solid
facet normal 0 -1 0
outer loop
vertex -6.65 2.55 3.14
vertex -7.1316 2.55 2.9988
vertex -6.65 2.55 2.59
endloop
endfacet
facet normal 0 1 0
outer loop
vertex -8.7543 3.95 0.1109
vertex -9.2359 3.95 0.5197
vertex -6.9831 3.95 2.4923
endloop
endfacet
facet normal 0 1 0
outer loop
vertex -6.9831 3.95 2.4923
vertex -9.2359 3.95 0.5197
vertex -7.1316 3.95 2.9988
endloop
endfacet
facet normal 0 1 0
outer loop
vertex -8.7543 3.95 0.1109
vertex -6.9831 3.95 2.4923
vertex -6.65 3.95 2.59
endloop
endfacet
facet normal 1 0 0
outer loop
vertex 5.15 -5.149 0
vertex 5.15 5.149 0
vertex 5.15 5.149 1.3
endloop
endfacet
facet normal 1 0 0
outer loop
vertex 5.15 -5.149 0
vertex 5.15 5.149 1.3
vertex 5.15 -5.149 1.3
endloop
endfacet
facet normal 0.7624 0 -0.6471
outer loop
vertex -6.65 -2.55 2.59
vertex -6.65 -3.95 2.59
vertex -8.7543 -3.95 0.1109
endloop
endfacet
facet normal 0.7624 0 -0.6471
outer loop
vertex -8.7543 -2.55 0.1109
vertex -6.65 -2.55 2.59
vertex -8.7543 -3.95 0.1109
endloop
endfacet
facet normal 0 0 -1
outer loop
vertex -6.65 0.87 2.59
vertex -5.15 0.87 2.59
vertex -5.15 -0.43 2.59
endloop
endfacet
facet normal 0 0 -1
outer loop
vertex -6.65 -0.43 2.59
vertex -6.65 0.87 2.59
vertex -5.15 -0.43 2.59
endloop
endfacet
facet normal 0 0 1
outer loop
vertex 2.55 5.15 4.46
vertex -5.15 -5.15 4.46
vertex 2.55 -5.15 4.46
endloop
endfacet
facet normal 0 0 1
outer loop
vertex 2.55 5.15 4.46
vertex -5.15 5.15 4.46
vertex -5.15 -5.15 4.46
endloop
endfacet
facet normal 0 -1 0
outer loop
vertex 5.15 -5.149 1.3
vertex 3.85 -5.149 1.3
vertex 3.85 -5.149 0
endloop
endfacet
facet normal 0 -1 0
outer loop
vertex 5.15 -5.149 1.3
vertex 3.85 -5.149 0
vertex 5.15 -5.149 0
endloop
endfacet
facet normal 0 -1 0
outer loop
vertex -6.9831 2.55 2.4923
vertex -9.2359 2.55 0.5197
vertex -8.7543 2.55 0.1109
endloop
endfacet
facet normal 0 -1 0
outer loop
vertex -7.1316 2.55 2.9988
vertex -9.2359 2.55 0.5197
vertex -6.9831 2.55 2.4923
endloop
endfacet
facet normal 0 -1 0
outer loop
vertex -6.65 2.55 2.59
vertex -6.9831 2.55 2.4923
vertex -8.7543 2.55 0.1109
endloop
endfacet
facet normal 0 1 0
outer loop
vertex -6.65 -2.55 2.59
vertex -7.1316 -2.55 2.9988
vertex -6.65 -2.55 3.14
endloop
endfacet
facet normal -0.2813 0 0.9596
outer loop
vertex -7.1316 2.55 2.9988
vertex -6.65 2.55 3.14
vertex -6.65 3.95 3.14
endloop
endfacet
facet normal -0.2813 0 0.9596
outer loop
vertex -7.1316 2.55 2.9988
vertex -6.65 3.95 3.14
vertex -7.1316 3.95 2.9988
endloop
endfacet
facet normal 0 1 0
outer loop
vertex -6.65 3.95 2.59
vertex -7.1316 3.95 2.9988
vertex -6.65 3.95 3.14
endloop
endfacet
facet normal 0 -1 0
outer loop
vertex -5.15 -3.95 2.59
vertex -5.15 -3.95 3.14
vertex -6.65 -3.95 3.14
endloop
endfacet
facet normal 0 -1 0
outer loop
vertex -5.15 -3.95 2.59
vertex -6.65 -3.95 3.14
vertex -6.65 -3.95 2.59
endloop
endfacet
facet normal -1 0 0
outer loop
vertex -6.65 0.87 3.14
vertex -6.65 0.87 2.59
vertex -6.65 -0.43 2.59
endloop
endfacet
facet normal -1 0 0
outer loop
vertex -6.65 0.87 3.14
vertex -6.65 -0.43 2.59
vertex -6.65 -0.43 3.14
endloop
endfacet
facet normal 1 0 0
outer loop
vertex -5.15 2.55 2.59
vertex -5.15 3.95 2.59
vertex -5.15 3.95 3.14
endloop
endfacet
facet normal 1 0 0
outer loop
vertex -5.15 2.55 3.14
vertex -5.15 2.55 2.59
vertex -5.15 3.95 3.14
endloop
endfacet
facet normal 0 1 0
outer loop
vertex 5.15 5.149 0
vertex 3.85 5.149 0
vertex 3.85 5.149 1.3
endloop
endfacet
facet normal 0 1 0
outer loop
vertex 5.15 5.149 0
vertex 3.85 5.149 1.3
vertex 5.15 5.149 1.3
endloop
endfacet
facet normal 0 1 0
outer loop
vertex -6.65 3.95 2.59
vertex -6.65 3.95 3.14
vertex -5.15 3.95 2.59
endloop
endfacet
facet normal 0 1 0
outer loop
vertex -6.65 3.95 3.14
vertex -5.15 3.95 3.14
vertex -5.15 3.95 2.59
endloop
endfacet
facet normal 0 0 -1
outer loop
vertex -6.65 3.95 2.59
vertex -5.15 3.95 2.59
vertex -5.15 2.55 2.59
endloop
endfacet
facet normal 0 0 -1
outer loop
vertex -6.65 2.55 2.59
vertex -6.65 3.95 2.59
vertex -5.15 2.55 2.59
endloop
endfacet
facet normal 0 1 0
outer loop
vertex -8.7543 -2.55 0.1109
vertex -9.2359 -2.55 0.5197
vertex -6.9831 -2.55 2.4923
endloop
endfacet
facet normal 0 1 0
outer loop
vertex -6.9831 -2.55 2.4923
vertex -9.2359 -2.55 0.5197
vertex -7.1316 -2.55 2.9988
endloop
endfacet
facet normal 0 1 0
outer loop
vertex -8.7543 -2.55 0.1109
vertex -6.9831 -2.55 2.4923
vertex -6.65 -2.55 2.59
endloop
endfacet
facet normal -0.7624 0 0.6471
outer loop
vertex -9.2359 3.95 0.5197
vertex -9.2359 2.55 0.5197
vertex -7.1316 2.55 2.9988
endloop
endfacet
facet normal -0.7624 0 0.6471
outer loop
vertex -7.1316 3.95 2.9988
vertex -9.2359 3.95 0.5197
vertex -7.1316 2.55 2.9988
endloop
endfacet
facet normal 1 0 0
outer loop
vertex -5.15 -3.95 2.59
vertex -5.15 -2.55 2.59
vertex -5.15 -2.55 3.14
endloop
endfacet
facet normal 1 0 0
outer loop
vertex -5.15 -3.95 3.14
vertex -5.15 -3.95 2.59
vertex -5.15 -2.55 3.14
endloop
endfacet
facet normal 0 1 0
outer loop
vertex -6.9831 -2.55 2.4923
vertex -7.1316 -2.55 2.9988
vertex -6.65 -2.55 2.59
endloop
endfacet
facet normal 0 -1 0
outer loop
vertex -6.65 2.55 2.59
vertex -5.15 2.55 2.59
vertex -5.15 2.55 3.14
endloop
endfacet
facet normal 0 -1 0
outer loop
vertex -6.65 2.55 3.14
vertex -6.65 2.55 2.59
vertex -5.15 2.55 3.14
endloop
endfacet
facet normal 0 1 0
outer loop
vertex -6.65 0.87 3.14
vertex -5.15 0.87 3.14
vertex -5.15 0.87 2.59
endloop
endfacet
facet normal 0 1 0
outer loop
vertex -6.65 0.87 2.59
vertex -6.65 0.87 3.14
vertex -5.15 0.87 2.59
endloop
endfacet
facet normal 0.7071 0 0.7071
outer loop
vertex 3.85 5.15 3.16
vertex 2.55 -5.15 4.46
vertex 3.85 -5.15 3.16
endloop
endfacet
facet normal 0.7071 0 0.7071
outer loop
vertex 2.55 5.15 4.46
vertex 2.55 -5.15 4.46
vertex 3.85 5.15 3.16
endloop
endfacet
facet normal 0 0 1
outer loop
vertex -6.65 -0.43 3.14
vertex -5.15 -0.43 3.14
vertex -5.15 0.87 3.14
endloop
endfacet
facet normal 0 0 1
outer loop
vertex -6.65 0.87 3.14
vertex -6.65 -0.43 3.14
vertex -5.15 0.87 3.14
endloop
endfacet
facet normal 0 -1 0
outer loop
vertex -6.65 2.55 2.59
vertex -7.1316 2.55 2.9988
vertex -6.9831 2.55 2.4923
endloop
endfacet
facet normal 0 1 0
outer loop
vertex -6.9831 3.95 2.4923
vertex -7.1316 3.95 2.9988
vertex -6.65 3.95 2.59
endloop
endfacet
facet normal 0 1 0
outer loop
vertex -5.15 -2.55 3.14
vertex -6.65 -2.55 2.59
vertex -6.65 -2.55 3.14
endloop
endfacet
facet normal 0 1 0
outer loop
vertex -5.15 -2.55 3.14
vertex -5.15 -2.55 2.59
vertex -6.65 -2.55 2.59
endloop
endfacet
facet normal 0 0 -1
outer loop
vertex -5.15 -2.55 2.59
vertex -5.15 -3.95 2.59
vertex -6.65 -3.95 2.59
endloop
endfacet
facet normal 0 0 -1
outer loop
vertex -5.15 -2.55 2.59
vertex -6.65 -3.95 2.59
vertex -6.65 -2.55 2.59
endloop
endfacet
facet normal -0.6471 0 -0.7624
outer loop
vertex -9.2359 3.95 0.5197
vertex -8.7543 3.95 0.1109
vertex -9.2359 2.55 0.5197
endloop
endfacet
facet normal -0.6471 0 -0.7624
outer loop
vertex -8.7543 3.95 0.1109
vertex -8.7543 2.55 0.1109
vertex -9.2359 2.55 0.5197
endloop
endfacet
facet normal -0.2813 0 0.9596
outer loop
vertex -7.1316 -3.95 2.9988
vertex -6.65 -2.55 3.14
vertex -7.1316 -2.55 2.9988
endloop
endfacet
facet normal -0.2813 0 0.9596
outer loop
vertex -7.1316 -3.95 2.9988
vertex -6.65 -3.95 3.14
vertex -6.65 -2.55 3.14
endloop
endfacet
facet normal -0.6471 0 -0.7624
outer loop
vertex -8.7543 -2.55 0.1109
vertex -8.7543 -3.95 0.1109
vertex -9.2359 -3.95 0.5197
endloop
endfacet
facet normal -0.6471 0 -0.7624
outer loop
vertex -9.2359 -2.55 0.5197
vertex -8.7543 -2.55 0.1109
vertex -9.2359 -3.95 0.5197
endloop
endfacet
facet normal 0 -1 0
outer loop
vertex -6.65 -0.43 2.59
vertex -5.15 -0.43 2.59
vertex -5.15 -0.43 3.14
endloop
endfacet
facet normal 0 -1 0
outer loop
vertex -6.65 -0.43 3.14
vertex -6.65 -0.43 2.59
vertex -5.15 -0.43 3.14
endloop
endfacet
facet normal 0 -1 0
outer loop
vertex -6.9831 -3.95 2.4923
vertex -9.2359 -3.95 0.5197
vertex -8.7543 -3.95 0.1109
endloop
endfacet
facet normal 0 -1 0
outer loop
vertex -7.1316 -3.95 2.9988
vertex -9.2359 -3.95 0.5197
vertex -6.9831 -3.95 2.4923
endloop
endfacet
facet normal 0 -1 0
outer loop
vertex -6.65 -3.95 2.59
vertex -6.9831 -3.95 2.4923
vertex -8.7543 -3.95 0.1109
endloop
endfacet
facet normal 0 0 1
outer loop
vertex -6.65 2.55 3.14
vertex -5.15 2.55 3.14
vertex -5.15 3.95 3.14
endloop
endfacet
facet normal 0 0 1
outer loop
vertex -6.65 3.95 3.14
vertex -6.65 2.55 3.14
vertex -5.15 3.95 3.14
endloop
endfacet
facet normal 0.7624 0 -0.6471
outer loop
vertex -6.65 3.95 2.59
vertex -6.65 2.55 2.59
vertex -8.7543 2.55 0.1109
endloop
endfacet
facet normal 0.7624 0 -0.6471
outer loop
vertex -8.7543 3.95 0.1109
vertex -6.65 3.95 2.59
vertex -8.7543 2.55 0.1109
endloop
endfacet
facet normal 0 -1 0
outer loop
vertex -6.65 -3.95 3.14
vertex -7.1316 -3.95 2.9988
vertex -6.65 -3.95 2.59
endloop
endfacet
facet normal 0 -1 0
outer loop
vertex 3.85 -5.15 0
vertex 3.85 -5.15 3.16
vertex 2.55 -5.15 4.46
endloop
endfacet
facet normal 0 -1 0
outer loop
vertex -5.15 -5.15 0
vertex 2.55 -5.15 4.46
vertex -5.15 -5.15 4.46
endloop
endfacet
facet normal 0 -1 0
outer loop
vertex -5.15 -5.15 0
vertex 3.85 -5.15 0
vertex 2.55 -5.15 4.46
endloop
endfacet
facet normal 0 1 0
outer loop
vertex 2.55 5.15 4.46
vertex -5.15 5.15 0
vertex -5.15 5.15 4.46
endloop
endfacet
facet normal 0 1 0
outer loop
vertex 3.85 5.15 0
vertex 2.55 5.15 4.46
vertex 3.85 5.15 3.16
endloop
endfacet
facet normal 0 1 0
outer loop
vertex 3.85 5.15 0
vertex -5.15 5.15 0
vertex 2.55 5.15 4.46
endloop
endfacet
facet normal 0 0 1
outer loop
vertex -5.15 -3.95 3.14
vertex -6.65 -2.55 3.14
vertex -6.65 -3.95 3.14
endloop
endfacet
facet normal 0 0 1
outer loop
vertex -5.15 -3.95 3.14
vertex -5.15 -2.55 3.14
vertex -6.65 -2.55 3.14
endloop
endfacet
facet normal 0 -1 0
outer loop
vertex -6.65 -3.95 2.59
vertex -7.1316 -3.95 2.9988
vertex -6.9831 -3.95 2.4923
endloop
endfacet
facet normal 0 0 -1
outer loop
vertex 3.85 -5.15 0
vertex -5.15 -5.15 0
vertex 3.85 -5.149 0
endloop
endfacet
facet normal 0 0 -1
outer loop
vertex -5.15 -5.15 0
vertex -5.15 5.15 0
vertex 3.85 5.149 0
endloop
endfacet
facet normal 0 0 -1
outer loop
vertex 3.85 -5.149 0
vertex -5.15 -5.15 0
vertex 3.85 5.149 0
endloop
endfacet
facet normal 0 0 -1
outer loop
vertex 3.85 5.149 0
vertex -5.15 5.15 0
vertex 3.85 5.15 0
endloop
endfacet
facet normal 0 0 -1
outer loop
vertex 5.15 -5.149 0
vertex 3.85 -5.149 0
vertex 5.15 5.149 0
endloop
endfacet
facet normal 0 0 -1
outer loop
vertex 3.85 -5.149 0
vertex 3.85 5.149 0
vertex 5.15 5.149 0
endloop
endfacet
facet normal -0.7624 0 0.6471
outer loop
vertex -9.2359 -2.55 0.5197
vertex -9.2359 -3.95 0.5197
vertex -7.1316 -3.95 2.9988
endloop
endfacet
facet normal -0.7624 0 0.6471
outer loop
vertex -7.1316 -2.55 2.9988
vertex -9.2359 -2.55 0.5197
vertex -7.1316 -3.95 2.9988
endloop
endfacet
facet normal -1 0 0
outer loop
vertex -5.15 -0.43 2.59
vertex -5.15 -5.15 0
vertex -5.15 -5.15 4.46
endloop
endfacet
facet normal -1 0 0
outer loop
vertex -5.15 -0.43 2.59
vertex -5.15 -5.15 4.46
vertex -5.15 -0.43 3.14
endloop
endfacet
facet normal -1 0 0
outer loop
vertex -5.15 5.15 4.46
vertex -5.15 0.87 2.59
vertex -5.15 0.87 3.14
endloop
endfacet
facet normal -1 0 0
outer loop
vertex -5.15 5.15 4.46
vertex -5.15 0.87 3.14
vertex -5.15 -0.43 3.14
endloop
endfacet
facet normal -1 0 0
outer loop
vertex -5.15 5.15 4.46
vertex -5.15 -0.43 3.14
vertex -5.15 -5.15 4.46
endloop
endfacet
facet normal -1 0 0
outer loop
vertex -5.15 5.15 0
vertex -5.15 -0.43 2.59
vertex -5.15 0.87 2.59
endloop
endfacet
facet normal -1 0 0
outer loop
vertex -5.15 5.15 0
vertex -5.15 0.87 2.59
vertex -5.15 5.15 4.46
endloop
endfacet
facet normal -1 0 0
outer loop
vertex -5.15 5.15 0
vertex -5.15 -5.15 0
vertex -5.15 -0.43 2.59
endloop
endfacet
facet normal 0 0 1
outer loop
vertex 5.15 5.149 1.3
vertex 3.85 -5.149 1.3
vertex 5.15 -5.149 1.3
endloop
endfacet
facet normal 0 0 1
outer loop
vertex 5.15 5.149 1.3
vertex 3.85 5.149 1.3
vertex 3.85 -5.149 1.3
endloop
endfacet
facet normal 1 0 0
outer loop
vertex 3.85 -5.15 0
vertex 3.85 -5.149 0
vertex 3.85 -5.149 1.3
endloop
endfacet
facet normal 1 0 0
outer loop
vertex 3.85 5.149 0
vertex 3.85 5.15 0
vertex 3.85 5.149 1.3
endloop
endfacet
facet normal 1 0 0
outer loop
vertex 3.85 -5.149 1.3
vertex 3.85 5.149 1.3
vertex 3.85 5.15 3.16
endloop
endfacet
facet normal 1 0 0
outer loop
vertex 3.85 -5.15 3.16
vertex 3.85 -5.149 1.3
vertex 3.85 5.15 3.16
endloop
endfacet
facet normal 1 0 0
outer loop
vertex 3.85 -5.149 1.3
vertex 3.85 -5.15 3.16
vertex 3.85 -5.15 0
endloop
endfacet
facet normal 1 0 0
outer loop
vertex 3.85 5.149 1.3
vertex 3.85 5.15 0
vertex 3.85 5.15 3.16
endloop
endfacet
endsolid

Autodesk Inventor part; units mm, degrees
ref_plane "YZ Plane" through (0, 0, 0) normal (1, 0, 0) x (0, 1, 0)
ref_plane "XZ Plane" through (0, 0, 0) normal (0, 1, 0) x (-1, 0, 0)
ref_plane "XY Plane" through (0, 0, 0) normal (0, 0, 1) x (1, 0, 0)
sketch "Skizze1" plane through (0, 0, 0) normal (0, 0, 1) x (1, 0, 0)
  line L0 (-5.15, 5.15) -> (5.15, 5.15)
  line L1 (5.15, 5.15) -> (5.15, -5.15)
  line L2 (5.15, -5.15) -> (-5.15, -5.15)
  line L3 (-5.15, -5.15) -> (-5.15, 5.15)
  line L4 (-5.15, 5.15) -> (5.15, -5.15) construction
  point P0 (0, 0)
  point P1 (0, 0)
  dimension "d0" = 10.3
  dimension "d1" = 10.3
extrude "Extrusion1" add sketch "Skizze1" along normal blind 1.3
sketch "Skizze2" plane through (0, 0, 1.3) normal (0, 0, 1) x (1, 0, 0)
  line L0 (5.15, 5.15) -> (-5.15, 5.15) projected
  line L1 (-5.15, 5.15) -> (3.85, 5.15)
  line L2 (3.85, 5.15) -> (3.85, -5.15)
  line L3 (3.85, -5.15) -> (-5.15, -5.15)
  line L4 (-5.15, -5.15) -> (-5.15, 5.15)
  point P0 (0, 0)
  dimension "d4" = 9
  dimension "d5" = 10.3
extrude "Extrusion2" add sketch "Skizze2" along normal blind 3.16
chamfer "Fase1" distance 1.3 angle 45 1 edges at (3.85, 0, 4.46)
sketch "Skizze3" plane through (-5.15, -5.15, 0) normal (0, -1, 0) x (1, 0, 0)
  line L0 (10.3, 1.3) -> (9, 1.3) projected
  line L1 (0, 0) -> (10.3, 0) projected
  line L2 (9, 1.3) -> (10.3, 1.3)
  line L3 (10.3, 1.3) -> (10.3, 0)
  line L4 (10.3, 0) -> (9, 0)
  line L5 (9, 0) -> (9, 1.3)
  point P0 (5.15, 0)
extrude "Extrusion3" cut sketch "Skizze3" against normal blind 0.001
sketch "Skizze4" plane through (-5.15, 5.15, 0) normal (0, 1, 0) x (1, 0, 0)
  line L0 (9, 0) -> (9, -1.3) projected
  line L1 (10.3, -1.3) -> (10.3, 0) projected
  line L2 (9, -1.3) -> (10.3, -1.3)
  line L3 (10.3, -1.3) -> (10.3, 0)
  line L4 (10.3, 0) -> (9, 0)
  line L5 (9, 0) -> (9, -1.3)
  point P0 (5.15, 0)
extrude "Extrusion4" cut sketch "Skizze4" against normal blind 0.001
sketch "Skizze7" plane through (-5.15, -5.15, 0) normal (-1, 0, 0) x (0, 0, 1)
  line L0 (4.46, 10.3) -> (4.46, 0) construction
  line L1 (4.46, 10.3) -> (4.46, 9.1) construction
  line L2 (4.46, 9.1) -> (3.14, 9.1) construction
  line L3 (3.14, 9.1) -> (2.59, 9.1)
  line L4 (2.59, 9.1) -> (2.59, 7.7)
  line L5 (2.59, 7.7) -> (3.14, 7.7)
  line L6 (3.14, 7.7) -> (3.14, 9.1)
  line L7 (0, 0) -> (4.46, 0) construction
  line L8 (4.46, 0) -> (4.46, 1.2) construction
  line L9 (4.46, 1.2) -> (3.14, 1.2) construction
  line L10 (3.14, 1.2) -> (2.59, 1.2)
  line L11 (2.59, 1.2) -> (2.59, 2.6)
  line L12 (2.59, 2.6) -> (3.14, 2.6)
  line L13 (3.14, 2.6) -> (3.14, 1.2)
  point P0 (0, 5.15)
  point P1 (0, 10.3)
  dimension "d20" = 1.2
  dimension "d21" = 1.32
  dimension "d22" = 0.55
  dimension "d23" = 1.4
  dimension "d24" = 1.2
  dimension "d25" = 1.32
extrude "Extrusion5" add sketch "Skizze7" along normal blind 1.5 separate body
sketch "Skizze9" plane through (-5.15, -3.95, 2.59) normal (0, -1, 0) x (1, 0, 0)
  line L0 (-1.5, 0) -> (-1.5, 0.55) projected
  line L1 (-1.5, 0) -> (-3.6043, -2.4791)
  line L2 (-3.6043, -2.4791) -> (-4.0859, -2.0703)
  line L3 (-4.0859, -2.0703) -> (-1.9816, 0.4088)
  line L4 (-1.9816, 0.4088) -> (-1.5, 0)
  line L5 (-1.5, 0.55) -> (-1.9816, 0.4088)
  line L6 (-1.9816, 0.4088) -> (-1.8331, -0.0977)
  line L7 (-1.8331, -0.0977) -> (-1.3515, 0.0435)
  line L8 (-1.3515, 0.0435) -> (-1.5, 0.55)
  point P0 (5.15, -2.59)
extrude "Extrusion6" add sketch "Skizze9" against normal blind 1.4 contours L4 L5 L0 | L7 L6 L4 | L1 L2 L3 L6 L7 bodies 2
sketch "Skizze11" plane through (-5.15, 2.55, 2.59) normal (0, -1, 0) x (1, 0, 0)
  line L0 (-1.5, 0) -> (-1.5, 0.55)
  line L1 (-1.5, 0) -> (-3.6043, -2.4791)
  line L2 (-3.6043, -2.4791) -> (-4.0859, -2.0703)
  line L3 (-4.0859, -2.0703) -> (-1.9816, 0.4088)
  line L4 (-1.9816, 0.4088) -> (-1.5, 0)
  line L5 (-1.5, 0.55) -> (-1.9816, 0.4088)
  line L6 (-1.9816, 0.4088) -> (-1.8331, -0.0977)
  line L7 (-1.8331, -0.0977) -> (-1.3515, 0.0435)
  line L8 (-1.3515, 0.0435) -> (-1.5, 0.55)
  point P0 (5.15, -2.59)
extrude "Extrusion8" add sketch "Skizze11" against normal blind 1.4 contours L4 L5 L0 | L7 L6 L4 | L1 L2 L3 L6 L7 bodies 2
sketch "Skizze12" plane through (-5.15, -5.15, 0) normal (-1, 0, 0) x (0, 0, 1)
  line L0 (2.59, 7.7) -> (3.14, 7.7) projected
  line L1 (2.865, 7.7) -> (2.865, 6.02) construction
  line L2 (2.865, 7.7) -> (4.545, 7.7) construction
  line L3 (3.14, 6.02) -> (2.59, 6.02)
  line L4 (2.59, 6.02) -> (2.59, 4.72)
  line L5 (2.59, 4.72) -> (3.14, 4.72)
  line L6 (3.14, 4.72) -> (3.14, 6.02)
  point P0 (0, 5.15)
  dimension "d40" = 1.68
  dimension "d41" = 90
  dimension "d42" = 0.55
  dimension "d43" = 1.3
extrude "Extrusion9" add sketch "Skizze12" along normal blind 1.5 bodies 1
properties part number "TN2540-800G-TR"
